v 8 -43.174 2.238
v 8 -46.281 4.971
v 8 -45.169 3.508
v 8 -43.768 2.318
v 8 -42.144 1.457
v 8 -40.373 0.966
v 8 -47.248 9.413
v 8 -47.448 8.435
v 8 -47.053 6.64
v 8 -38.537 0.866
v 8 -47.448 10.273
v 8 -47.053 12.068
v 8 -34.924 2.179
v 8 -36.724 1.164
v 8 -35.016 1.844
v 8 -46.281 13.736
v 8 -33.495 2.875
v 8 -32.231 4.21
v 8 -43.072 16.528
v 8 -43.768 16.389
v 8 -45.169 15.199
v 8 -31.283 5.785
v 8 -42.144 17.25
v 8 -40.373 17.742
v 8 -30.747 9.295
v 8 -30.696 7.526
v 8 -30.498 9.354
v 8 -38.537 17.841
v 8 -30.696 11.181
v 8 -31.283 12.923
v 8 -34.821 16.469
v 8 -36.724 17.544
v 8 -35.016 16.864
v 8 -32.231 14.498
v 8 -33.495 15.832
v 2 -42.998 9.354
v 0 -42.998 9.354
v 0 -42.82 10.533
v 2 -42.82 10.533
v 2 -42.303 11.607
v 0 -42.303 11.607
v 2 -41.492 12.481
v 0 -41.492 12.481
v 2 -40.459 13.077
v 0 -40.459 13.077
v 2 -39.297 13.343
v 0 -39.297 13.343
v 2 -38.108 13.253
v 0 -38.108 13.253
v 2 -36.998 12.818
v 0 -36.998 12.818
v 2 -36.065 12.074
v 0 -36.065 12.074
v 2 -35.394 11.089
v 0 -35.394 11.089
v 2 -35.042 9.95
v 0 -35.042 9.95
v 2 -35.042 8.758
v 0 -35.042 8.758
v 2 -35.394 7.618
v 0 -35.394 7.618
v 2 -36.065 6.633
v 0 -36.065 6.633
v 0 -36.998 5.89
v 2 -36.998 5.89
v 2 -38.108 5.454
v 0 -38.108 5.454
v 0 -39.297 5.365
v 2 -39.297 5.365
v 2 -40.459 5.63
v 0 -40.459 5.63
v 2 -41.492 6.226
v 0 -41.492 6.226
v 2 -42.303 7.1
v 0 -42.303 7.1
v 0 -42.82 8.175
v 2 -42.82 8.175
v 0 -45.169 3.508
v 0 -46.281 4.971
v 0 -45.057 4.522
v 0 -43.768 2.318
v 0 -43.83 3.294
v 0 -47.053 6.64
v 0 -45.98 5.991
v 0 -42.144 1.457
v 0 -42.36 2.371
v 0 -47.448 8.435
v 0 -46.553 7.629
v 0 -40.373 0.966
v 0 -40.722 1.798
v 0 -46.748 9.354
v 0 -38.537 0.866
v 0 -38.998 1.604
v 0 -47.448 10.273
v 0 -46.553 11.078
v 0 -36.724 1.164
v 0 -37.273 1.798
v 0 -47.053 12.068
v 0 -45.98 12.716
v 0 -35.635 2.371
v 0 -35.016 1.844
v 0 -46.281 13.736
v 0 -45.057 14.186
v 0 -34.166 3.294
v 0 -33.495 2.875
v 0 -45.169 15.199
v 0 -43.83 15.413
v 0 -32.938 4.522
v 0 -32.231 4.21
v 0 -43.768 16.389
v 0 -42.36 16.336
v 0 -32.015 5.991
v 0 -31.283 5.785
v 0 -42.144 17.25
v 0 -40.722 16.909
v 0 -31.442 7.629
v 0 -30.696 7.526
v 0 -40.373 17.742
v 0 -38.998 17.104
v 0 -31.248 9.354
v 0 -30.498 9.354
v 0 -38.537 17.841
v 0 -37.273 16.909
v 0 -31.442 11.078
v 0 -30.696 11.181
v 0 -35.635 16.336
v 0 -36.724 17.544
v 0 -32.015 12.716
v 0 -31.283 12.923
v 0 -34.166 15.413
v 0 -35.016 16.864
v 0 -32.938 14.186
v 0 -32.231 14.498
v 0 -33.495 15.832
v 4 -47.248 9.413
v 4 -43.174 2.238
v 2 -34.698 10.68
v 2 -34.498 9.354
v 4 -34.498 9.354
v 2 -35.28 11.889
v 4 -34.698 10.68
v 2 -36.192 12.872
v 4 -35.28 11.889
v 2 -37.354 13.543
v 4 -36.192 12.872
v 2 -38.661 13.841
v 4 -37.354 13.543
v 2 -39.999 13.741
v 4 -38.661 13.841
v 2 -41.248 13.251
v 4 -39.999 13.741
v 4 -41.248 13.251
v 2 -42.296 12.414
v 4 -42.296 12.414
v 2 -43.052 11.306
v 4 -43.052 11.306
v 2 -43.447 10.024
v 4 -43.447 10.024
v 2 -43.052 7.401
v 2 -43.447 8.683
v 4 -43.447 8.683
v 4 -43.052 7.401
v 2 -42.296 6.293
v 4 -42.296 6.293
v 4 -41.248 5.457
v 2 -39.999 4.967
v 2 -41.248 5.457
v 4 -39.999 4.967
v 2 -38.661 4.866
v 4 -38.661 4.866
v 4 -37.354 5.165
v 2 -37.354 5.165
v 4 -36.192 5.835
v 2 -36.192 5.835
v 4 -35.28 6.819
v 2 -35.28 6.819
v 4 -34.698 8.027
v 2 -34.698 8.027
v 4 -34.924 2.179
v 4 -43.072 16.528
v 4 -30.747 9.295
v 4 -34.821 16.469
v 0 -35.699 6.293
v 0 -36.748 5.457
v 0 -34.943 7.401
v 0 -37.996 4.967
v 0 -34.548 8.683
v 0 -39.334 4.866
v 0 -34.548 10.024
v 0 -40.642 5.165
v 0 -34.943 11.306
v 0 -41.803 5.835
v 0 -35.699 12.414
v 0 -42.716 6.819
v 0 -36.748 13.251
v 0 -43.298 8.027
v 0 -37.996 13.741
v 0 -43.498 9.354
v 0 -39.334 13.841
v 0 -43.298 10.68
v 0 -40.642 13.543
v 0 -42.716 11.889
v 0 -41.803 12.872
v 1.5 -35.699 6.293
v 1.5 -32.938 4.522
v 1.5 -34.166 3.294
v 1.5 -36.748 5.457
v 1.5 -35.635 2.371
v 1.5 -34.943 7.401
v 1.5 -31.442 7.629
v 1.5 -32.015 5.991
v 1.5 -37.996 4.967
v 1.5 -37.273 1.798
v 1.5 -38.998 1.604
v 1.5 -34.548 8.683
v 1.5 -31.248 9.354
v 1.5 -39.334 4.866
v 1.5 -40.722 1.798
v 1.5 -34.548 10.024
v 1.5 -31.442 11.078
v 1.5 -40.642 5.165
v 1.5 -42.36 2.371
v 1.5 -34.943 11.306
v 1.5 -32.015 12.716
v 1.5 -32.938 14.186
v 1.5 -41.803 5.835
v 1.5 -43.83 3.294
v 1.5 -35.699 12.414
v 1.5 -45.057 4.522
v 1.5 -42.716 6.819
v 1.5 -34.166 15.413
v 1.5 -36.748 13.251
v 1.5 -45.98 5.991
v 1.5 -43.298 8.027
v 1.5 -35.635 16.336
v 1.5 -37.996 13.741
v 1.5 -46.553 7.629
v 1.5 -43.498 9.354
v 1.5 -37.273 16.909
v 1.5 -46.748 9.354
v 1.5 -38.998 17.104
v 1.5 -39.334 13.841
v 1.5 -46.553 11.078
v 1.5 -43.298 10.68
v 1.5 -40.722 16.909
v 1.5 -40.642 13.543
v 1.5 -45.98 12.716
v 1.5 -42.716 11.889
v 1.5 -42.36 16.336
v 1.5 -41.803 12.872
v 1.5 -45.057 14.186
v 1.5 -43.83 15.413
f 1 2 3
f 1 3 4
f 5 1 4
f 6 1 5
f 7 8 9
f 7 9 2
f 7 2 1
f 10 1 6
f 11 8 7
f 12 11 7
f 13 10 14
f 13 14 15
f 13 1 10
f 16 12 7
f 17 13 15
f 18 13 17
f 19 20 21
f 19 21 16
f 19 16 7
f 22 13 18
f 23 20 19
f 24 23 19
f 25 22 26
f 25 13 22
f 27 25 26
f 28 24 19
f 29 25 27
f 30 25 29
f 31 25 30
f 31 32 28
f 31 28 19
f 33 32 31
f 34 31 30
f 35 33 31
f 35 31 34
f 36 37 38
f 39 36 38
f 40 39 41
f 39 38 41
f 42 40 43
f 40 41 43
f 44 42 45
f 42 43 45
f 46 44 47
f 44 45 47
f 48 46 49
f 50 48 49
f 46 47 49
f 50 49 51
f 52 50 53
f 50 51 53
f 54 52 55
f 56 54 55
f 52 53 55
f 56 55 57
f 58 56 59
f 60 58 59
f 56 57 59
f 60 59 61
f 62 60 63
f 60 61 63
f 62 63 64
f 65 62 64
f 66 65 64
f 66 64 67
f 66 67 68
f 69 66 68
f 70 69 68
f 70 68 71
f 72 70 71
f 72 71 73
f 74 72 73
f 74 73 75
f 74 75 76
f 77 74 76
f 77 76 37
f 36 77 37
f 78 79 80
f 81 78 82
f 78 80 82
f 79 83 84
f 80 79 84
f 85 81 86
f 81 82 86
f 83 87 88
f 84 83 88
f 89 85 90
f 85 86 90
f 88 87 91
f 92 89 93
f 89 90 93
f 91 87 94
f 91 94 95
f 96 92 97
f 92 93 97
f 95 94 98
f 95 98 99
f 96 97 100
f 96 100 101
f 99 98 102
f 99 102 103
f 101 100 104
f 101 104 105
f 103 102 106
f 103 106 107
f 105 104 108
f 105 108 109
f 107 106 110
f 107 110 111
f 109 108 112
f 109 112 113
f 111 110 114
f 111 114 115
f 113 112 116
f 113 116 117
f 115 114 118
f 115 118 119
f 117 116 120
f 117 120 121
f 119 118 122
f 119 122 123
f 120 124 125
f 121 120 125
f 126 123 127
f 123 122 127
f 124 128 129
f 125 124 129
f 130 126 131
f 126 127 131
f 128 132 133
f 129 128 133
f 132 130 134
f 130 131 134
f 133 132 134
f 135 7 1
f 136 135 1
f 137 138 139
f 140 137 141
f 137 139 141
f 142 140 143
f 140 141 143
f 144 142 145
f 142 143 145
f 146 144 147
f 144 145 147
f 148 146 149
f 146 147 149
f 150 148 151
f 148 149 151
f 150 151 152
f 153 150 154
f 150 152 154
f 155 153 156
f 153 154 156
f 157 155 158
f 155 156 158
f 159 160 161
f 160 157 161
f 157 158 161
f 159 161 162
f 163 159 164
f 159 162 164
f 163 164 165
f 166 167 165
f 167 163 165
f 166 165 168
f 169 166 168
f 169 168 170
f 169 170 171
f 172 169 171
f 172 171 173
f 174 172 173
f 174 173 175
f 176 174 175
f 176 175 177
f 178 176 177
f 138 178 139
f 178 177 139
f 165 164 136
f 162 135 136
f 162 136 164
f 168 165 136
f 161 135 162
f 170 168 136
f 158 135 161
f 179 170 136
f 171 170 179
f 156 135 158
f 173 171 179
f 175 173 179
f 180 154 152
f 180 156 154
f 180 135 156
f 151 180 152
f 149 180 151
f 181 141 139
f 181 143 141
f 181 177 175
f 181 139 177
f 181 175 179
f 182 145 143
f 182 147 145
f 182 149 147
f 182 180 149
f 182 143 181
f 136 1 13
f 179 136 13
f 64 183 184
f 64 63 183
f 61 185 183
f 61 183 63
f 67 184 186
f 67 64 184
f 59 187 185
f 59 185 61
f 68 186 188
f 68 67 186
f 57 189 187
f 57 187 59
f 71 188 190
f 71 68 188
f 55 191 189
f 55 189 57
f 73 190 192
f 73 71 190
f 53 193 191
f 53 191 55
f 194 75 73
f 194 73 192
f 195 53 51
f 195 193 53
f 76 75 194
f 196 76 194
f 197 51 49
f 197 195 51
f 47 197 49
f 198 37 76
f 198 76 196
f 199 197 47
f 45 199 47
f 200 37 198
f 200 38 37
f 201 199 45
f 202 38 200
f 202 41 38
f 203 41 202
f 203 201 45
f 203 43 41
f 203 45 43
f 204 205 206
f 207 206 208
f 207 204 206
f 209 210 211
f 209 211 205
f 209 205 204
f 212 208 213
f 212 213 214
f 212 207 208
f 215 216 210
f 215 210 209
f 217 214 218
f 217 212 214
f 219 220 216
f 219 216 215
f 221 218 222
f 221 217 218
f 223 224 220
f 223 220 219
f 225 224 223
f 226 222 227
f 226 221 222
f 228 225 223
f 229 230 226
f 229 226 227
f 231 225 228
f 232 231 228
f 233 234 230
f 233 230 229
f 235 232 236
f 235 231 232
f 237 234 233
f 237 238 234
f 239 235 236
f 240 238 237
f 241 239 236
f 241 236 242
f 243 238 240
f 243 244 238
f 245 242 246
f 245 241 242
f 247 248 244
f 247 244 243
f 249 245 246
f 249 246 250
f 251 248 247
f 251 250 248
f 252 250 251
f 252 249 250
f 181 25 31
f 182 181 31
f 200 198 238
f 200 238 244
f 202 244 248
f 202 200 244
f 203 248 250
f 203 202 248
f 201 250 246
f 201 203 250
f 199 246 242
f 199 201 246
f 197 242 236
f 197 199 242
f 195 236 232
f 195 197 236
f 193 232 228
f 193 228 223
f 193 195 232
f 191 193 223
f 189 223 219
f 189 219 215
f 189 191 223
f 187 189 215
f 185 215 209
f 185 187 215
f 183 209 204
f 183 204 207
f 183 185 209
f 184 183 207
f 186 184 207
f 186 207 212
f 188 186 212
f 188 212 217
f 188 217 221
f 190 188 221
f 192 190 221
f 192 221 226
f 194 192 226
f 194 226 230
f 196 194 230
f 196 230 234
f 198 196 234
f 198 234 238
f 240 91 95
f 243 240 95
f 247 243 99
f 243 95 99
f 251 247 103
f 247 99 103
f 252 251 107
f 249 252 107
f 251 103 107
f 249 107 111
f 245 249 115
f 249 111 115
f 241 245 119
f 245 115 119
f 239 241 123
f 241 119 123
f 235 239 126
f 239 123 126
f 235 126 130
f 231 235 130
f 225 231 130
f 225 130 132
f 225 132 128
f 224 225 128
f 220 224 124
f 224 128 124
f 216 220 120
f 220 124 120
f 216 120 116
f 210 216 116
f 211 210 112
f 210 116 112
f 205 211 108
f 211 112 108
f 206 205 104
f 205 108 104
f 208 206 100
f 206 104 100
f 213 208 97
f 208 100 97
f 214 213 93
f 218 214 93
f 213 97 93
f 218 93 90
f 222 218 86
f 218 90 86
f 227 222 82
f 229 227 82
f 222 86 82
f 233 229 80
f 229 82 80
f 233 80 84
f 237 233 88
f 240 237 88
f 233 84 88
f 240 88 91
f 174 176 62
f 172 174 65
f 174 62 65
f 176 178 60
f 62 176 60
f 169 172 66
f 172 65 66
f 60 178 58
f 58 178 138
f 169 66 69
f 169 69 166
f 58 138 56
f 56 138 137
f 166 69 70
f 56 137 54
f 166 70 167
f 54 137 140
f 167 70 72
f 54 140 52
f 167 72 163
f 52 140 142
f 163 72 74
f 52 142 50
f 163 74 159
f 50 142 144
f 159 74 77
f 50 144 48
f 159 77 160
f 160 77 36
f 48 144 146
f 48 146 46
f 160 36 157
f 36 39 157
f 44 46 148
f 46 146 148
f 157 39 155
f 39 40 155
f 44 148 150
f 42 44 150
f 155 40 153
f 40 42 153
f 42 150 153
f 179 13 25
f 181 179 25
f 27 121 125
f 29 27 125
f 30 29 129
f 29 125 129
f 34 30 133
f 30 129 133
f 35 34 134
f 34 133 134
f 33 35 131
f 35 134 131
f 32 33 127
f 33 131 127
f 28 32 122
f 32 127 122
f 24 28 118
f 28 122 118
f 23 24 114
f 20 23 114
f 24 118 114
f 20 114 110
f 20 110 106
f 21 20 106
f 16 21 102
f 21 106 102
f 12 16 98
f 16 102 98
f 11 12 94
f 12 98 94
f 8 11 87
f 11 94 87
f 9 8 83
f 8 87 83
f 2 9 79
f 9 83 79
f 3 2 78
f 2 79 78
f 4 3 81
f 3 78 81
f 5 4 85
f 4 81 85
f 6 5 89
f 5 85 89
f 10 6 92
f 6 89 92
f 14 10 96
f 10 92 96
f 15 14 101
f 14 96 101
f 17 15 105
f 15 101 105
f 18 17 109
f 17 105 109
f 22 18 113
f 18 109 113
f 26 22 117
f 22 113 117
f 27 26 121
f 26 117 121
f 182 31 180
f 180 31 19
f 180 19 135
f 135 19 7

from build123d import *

# Parameters (mm, degrees)
F0_R      = 8.5
F1_DEPTH  = 8
F3_DEPTH  = 4
F4_R      = 7.75
F5_DEPTH  = 1.5
F7_R      = 4.5
F8_DEPTH  = 25
F6_R      = 4.5
F9_DEPTH  = 2
F10_R     = 4
F11_DEPTH = 10


with BuildPart() as f1:
    # F0 (on Right) → F1 (new body)
    with BuildSketch(Plane.YZ):
        with Locations((-38.9976724982, 9.3536879867)):
            Circle(F0_R)
    extrude(amount=F1_DEPTH)

    # F2 (on face) → F3 (cut)
    with BuildSketch(Plane.YZ.offset(8)):
        Polygon((-34.8214355244, 16.4690979189), (-43.0716797709, 16.5281202644), (-47.2479167448, 9.4127103322), (-43.1739094721, 2.2382780545), (-34.9236652255, 2.1792557091), (-30.7474282517, 9.2946656413), align=None)
    extrude(amount=-F3_DEPTH, mode=Mode.SUBTRACT)

    # F4 (on face) → F5 (cut)
    with BuildSketch(Plane(origin=(0, 0, 0), x_dir=(0, -1, 0), z_dir=(-1, 0, 0))):
        with Locations((38.9976724982, 9.3536879867)):
            Circle(F4_R)
    extrude(amount=-F5_DEPTH, mode=Mode.SUBTRACT)

    # F7 (on face) → F8 (cut)
    with BuildSketch(Plane.YZ.offset(4)):
        with Locations((-38.9976724982, 9.3536879867)):
            Circle(F7_R)
    extrude(amount=-F8_DEPTH, mode=Mode.SUBTRACT)

    # F6 (on face) → F9 (join)
    with BuildSketch(Plane(origin=(0, 0, 0), x_dir=(0, -1, 0), z_dir=(-1, 0, 0))):
        with Locations((38.9976724982, 9.3536879867)):
            Circle(F6_R)
    extrude(amount=-F9_DEPTH)

    # F10 (on face) → F11 (cut)
    with BuildSketch(Plane(origin=(0, 0, 0), x_dir=(0, -1, 0), z_dir=(-1, 0, 0))):
        with Locations((38.9976724982, 9.3536879867)):
            Circle(F10_R)
    extrude(amount=-F11_DEPTH, mode=Mode.SUBTRACT)


solid = f1.part
